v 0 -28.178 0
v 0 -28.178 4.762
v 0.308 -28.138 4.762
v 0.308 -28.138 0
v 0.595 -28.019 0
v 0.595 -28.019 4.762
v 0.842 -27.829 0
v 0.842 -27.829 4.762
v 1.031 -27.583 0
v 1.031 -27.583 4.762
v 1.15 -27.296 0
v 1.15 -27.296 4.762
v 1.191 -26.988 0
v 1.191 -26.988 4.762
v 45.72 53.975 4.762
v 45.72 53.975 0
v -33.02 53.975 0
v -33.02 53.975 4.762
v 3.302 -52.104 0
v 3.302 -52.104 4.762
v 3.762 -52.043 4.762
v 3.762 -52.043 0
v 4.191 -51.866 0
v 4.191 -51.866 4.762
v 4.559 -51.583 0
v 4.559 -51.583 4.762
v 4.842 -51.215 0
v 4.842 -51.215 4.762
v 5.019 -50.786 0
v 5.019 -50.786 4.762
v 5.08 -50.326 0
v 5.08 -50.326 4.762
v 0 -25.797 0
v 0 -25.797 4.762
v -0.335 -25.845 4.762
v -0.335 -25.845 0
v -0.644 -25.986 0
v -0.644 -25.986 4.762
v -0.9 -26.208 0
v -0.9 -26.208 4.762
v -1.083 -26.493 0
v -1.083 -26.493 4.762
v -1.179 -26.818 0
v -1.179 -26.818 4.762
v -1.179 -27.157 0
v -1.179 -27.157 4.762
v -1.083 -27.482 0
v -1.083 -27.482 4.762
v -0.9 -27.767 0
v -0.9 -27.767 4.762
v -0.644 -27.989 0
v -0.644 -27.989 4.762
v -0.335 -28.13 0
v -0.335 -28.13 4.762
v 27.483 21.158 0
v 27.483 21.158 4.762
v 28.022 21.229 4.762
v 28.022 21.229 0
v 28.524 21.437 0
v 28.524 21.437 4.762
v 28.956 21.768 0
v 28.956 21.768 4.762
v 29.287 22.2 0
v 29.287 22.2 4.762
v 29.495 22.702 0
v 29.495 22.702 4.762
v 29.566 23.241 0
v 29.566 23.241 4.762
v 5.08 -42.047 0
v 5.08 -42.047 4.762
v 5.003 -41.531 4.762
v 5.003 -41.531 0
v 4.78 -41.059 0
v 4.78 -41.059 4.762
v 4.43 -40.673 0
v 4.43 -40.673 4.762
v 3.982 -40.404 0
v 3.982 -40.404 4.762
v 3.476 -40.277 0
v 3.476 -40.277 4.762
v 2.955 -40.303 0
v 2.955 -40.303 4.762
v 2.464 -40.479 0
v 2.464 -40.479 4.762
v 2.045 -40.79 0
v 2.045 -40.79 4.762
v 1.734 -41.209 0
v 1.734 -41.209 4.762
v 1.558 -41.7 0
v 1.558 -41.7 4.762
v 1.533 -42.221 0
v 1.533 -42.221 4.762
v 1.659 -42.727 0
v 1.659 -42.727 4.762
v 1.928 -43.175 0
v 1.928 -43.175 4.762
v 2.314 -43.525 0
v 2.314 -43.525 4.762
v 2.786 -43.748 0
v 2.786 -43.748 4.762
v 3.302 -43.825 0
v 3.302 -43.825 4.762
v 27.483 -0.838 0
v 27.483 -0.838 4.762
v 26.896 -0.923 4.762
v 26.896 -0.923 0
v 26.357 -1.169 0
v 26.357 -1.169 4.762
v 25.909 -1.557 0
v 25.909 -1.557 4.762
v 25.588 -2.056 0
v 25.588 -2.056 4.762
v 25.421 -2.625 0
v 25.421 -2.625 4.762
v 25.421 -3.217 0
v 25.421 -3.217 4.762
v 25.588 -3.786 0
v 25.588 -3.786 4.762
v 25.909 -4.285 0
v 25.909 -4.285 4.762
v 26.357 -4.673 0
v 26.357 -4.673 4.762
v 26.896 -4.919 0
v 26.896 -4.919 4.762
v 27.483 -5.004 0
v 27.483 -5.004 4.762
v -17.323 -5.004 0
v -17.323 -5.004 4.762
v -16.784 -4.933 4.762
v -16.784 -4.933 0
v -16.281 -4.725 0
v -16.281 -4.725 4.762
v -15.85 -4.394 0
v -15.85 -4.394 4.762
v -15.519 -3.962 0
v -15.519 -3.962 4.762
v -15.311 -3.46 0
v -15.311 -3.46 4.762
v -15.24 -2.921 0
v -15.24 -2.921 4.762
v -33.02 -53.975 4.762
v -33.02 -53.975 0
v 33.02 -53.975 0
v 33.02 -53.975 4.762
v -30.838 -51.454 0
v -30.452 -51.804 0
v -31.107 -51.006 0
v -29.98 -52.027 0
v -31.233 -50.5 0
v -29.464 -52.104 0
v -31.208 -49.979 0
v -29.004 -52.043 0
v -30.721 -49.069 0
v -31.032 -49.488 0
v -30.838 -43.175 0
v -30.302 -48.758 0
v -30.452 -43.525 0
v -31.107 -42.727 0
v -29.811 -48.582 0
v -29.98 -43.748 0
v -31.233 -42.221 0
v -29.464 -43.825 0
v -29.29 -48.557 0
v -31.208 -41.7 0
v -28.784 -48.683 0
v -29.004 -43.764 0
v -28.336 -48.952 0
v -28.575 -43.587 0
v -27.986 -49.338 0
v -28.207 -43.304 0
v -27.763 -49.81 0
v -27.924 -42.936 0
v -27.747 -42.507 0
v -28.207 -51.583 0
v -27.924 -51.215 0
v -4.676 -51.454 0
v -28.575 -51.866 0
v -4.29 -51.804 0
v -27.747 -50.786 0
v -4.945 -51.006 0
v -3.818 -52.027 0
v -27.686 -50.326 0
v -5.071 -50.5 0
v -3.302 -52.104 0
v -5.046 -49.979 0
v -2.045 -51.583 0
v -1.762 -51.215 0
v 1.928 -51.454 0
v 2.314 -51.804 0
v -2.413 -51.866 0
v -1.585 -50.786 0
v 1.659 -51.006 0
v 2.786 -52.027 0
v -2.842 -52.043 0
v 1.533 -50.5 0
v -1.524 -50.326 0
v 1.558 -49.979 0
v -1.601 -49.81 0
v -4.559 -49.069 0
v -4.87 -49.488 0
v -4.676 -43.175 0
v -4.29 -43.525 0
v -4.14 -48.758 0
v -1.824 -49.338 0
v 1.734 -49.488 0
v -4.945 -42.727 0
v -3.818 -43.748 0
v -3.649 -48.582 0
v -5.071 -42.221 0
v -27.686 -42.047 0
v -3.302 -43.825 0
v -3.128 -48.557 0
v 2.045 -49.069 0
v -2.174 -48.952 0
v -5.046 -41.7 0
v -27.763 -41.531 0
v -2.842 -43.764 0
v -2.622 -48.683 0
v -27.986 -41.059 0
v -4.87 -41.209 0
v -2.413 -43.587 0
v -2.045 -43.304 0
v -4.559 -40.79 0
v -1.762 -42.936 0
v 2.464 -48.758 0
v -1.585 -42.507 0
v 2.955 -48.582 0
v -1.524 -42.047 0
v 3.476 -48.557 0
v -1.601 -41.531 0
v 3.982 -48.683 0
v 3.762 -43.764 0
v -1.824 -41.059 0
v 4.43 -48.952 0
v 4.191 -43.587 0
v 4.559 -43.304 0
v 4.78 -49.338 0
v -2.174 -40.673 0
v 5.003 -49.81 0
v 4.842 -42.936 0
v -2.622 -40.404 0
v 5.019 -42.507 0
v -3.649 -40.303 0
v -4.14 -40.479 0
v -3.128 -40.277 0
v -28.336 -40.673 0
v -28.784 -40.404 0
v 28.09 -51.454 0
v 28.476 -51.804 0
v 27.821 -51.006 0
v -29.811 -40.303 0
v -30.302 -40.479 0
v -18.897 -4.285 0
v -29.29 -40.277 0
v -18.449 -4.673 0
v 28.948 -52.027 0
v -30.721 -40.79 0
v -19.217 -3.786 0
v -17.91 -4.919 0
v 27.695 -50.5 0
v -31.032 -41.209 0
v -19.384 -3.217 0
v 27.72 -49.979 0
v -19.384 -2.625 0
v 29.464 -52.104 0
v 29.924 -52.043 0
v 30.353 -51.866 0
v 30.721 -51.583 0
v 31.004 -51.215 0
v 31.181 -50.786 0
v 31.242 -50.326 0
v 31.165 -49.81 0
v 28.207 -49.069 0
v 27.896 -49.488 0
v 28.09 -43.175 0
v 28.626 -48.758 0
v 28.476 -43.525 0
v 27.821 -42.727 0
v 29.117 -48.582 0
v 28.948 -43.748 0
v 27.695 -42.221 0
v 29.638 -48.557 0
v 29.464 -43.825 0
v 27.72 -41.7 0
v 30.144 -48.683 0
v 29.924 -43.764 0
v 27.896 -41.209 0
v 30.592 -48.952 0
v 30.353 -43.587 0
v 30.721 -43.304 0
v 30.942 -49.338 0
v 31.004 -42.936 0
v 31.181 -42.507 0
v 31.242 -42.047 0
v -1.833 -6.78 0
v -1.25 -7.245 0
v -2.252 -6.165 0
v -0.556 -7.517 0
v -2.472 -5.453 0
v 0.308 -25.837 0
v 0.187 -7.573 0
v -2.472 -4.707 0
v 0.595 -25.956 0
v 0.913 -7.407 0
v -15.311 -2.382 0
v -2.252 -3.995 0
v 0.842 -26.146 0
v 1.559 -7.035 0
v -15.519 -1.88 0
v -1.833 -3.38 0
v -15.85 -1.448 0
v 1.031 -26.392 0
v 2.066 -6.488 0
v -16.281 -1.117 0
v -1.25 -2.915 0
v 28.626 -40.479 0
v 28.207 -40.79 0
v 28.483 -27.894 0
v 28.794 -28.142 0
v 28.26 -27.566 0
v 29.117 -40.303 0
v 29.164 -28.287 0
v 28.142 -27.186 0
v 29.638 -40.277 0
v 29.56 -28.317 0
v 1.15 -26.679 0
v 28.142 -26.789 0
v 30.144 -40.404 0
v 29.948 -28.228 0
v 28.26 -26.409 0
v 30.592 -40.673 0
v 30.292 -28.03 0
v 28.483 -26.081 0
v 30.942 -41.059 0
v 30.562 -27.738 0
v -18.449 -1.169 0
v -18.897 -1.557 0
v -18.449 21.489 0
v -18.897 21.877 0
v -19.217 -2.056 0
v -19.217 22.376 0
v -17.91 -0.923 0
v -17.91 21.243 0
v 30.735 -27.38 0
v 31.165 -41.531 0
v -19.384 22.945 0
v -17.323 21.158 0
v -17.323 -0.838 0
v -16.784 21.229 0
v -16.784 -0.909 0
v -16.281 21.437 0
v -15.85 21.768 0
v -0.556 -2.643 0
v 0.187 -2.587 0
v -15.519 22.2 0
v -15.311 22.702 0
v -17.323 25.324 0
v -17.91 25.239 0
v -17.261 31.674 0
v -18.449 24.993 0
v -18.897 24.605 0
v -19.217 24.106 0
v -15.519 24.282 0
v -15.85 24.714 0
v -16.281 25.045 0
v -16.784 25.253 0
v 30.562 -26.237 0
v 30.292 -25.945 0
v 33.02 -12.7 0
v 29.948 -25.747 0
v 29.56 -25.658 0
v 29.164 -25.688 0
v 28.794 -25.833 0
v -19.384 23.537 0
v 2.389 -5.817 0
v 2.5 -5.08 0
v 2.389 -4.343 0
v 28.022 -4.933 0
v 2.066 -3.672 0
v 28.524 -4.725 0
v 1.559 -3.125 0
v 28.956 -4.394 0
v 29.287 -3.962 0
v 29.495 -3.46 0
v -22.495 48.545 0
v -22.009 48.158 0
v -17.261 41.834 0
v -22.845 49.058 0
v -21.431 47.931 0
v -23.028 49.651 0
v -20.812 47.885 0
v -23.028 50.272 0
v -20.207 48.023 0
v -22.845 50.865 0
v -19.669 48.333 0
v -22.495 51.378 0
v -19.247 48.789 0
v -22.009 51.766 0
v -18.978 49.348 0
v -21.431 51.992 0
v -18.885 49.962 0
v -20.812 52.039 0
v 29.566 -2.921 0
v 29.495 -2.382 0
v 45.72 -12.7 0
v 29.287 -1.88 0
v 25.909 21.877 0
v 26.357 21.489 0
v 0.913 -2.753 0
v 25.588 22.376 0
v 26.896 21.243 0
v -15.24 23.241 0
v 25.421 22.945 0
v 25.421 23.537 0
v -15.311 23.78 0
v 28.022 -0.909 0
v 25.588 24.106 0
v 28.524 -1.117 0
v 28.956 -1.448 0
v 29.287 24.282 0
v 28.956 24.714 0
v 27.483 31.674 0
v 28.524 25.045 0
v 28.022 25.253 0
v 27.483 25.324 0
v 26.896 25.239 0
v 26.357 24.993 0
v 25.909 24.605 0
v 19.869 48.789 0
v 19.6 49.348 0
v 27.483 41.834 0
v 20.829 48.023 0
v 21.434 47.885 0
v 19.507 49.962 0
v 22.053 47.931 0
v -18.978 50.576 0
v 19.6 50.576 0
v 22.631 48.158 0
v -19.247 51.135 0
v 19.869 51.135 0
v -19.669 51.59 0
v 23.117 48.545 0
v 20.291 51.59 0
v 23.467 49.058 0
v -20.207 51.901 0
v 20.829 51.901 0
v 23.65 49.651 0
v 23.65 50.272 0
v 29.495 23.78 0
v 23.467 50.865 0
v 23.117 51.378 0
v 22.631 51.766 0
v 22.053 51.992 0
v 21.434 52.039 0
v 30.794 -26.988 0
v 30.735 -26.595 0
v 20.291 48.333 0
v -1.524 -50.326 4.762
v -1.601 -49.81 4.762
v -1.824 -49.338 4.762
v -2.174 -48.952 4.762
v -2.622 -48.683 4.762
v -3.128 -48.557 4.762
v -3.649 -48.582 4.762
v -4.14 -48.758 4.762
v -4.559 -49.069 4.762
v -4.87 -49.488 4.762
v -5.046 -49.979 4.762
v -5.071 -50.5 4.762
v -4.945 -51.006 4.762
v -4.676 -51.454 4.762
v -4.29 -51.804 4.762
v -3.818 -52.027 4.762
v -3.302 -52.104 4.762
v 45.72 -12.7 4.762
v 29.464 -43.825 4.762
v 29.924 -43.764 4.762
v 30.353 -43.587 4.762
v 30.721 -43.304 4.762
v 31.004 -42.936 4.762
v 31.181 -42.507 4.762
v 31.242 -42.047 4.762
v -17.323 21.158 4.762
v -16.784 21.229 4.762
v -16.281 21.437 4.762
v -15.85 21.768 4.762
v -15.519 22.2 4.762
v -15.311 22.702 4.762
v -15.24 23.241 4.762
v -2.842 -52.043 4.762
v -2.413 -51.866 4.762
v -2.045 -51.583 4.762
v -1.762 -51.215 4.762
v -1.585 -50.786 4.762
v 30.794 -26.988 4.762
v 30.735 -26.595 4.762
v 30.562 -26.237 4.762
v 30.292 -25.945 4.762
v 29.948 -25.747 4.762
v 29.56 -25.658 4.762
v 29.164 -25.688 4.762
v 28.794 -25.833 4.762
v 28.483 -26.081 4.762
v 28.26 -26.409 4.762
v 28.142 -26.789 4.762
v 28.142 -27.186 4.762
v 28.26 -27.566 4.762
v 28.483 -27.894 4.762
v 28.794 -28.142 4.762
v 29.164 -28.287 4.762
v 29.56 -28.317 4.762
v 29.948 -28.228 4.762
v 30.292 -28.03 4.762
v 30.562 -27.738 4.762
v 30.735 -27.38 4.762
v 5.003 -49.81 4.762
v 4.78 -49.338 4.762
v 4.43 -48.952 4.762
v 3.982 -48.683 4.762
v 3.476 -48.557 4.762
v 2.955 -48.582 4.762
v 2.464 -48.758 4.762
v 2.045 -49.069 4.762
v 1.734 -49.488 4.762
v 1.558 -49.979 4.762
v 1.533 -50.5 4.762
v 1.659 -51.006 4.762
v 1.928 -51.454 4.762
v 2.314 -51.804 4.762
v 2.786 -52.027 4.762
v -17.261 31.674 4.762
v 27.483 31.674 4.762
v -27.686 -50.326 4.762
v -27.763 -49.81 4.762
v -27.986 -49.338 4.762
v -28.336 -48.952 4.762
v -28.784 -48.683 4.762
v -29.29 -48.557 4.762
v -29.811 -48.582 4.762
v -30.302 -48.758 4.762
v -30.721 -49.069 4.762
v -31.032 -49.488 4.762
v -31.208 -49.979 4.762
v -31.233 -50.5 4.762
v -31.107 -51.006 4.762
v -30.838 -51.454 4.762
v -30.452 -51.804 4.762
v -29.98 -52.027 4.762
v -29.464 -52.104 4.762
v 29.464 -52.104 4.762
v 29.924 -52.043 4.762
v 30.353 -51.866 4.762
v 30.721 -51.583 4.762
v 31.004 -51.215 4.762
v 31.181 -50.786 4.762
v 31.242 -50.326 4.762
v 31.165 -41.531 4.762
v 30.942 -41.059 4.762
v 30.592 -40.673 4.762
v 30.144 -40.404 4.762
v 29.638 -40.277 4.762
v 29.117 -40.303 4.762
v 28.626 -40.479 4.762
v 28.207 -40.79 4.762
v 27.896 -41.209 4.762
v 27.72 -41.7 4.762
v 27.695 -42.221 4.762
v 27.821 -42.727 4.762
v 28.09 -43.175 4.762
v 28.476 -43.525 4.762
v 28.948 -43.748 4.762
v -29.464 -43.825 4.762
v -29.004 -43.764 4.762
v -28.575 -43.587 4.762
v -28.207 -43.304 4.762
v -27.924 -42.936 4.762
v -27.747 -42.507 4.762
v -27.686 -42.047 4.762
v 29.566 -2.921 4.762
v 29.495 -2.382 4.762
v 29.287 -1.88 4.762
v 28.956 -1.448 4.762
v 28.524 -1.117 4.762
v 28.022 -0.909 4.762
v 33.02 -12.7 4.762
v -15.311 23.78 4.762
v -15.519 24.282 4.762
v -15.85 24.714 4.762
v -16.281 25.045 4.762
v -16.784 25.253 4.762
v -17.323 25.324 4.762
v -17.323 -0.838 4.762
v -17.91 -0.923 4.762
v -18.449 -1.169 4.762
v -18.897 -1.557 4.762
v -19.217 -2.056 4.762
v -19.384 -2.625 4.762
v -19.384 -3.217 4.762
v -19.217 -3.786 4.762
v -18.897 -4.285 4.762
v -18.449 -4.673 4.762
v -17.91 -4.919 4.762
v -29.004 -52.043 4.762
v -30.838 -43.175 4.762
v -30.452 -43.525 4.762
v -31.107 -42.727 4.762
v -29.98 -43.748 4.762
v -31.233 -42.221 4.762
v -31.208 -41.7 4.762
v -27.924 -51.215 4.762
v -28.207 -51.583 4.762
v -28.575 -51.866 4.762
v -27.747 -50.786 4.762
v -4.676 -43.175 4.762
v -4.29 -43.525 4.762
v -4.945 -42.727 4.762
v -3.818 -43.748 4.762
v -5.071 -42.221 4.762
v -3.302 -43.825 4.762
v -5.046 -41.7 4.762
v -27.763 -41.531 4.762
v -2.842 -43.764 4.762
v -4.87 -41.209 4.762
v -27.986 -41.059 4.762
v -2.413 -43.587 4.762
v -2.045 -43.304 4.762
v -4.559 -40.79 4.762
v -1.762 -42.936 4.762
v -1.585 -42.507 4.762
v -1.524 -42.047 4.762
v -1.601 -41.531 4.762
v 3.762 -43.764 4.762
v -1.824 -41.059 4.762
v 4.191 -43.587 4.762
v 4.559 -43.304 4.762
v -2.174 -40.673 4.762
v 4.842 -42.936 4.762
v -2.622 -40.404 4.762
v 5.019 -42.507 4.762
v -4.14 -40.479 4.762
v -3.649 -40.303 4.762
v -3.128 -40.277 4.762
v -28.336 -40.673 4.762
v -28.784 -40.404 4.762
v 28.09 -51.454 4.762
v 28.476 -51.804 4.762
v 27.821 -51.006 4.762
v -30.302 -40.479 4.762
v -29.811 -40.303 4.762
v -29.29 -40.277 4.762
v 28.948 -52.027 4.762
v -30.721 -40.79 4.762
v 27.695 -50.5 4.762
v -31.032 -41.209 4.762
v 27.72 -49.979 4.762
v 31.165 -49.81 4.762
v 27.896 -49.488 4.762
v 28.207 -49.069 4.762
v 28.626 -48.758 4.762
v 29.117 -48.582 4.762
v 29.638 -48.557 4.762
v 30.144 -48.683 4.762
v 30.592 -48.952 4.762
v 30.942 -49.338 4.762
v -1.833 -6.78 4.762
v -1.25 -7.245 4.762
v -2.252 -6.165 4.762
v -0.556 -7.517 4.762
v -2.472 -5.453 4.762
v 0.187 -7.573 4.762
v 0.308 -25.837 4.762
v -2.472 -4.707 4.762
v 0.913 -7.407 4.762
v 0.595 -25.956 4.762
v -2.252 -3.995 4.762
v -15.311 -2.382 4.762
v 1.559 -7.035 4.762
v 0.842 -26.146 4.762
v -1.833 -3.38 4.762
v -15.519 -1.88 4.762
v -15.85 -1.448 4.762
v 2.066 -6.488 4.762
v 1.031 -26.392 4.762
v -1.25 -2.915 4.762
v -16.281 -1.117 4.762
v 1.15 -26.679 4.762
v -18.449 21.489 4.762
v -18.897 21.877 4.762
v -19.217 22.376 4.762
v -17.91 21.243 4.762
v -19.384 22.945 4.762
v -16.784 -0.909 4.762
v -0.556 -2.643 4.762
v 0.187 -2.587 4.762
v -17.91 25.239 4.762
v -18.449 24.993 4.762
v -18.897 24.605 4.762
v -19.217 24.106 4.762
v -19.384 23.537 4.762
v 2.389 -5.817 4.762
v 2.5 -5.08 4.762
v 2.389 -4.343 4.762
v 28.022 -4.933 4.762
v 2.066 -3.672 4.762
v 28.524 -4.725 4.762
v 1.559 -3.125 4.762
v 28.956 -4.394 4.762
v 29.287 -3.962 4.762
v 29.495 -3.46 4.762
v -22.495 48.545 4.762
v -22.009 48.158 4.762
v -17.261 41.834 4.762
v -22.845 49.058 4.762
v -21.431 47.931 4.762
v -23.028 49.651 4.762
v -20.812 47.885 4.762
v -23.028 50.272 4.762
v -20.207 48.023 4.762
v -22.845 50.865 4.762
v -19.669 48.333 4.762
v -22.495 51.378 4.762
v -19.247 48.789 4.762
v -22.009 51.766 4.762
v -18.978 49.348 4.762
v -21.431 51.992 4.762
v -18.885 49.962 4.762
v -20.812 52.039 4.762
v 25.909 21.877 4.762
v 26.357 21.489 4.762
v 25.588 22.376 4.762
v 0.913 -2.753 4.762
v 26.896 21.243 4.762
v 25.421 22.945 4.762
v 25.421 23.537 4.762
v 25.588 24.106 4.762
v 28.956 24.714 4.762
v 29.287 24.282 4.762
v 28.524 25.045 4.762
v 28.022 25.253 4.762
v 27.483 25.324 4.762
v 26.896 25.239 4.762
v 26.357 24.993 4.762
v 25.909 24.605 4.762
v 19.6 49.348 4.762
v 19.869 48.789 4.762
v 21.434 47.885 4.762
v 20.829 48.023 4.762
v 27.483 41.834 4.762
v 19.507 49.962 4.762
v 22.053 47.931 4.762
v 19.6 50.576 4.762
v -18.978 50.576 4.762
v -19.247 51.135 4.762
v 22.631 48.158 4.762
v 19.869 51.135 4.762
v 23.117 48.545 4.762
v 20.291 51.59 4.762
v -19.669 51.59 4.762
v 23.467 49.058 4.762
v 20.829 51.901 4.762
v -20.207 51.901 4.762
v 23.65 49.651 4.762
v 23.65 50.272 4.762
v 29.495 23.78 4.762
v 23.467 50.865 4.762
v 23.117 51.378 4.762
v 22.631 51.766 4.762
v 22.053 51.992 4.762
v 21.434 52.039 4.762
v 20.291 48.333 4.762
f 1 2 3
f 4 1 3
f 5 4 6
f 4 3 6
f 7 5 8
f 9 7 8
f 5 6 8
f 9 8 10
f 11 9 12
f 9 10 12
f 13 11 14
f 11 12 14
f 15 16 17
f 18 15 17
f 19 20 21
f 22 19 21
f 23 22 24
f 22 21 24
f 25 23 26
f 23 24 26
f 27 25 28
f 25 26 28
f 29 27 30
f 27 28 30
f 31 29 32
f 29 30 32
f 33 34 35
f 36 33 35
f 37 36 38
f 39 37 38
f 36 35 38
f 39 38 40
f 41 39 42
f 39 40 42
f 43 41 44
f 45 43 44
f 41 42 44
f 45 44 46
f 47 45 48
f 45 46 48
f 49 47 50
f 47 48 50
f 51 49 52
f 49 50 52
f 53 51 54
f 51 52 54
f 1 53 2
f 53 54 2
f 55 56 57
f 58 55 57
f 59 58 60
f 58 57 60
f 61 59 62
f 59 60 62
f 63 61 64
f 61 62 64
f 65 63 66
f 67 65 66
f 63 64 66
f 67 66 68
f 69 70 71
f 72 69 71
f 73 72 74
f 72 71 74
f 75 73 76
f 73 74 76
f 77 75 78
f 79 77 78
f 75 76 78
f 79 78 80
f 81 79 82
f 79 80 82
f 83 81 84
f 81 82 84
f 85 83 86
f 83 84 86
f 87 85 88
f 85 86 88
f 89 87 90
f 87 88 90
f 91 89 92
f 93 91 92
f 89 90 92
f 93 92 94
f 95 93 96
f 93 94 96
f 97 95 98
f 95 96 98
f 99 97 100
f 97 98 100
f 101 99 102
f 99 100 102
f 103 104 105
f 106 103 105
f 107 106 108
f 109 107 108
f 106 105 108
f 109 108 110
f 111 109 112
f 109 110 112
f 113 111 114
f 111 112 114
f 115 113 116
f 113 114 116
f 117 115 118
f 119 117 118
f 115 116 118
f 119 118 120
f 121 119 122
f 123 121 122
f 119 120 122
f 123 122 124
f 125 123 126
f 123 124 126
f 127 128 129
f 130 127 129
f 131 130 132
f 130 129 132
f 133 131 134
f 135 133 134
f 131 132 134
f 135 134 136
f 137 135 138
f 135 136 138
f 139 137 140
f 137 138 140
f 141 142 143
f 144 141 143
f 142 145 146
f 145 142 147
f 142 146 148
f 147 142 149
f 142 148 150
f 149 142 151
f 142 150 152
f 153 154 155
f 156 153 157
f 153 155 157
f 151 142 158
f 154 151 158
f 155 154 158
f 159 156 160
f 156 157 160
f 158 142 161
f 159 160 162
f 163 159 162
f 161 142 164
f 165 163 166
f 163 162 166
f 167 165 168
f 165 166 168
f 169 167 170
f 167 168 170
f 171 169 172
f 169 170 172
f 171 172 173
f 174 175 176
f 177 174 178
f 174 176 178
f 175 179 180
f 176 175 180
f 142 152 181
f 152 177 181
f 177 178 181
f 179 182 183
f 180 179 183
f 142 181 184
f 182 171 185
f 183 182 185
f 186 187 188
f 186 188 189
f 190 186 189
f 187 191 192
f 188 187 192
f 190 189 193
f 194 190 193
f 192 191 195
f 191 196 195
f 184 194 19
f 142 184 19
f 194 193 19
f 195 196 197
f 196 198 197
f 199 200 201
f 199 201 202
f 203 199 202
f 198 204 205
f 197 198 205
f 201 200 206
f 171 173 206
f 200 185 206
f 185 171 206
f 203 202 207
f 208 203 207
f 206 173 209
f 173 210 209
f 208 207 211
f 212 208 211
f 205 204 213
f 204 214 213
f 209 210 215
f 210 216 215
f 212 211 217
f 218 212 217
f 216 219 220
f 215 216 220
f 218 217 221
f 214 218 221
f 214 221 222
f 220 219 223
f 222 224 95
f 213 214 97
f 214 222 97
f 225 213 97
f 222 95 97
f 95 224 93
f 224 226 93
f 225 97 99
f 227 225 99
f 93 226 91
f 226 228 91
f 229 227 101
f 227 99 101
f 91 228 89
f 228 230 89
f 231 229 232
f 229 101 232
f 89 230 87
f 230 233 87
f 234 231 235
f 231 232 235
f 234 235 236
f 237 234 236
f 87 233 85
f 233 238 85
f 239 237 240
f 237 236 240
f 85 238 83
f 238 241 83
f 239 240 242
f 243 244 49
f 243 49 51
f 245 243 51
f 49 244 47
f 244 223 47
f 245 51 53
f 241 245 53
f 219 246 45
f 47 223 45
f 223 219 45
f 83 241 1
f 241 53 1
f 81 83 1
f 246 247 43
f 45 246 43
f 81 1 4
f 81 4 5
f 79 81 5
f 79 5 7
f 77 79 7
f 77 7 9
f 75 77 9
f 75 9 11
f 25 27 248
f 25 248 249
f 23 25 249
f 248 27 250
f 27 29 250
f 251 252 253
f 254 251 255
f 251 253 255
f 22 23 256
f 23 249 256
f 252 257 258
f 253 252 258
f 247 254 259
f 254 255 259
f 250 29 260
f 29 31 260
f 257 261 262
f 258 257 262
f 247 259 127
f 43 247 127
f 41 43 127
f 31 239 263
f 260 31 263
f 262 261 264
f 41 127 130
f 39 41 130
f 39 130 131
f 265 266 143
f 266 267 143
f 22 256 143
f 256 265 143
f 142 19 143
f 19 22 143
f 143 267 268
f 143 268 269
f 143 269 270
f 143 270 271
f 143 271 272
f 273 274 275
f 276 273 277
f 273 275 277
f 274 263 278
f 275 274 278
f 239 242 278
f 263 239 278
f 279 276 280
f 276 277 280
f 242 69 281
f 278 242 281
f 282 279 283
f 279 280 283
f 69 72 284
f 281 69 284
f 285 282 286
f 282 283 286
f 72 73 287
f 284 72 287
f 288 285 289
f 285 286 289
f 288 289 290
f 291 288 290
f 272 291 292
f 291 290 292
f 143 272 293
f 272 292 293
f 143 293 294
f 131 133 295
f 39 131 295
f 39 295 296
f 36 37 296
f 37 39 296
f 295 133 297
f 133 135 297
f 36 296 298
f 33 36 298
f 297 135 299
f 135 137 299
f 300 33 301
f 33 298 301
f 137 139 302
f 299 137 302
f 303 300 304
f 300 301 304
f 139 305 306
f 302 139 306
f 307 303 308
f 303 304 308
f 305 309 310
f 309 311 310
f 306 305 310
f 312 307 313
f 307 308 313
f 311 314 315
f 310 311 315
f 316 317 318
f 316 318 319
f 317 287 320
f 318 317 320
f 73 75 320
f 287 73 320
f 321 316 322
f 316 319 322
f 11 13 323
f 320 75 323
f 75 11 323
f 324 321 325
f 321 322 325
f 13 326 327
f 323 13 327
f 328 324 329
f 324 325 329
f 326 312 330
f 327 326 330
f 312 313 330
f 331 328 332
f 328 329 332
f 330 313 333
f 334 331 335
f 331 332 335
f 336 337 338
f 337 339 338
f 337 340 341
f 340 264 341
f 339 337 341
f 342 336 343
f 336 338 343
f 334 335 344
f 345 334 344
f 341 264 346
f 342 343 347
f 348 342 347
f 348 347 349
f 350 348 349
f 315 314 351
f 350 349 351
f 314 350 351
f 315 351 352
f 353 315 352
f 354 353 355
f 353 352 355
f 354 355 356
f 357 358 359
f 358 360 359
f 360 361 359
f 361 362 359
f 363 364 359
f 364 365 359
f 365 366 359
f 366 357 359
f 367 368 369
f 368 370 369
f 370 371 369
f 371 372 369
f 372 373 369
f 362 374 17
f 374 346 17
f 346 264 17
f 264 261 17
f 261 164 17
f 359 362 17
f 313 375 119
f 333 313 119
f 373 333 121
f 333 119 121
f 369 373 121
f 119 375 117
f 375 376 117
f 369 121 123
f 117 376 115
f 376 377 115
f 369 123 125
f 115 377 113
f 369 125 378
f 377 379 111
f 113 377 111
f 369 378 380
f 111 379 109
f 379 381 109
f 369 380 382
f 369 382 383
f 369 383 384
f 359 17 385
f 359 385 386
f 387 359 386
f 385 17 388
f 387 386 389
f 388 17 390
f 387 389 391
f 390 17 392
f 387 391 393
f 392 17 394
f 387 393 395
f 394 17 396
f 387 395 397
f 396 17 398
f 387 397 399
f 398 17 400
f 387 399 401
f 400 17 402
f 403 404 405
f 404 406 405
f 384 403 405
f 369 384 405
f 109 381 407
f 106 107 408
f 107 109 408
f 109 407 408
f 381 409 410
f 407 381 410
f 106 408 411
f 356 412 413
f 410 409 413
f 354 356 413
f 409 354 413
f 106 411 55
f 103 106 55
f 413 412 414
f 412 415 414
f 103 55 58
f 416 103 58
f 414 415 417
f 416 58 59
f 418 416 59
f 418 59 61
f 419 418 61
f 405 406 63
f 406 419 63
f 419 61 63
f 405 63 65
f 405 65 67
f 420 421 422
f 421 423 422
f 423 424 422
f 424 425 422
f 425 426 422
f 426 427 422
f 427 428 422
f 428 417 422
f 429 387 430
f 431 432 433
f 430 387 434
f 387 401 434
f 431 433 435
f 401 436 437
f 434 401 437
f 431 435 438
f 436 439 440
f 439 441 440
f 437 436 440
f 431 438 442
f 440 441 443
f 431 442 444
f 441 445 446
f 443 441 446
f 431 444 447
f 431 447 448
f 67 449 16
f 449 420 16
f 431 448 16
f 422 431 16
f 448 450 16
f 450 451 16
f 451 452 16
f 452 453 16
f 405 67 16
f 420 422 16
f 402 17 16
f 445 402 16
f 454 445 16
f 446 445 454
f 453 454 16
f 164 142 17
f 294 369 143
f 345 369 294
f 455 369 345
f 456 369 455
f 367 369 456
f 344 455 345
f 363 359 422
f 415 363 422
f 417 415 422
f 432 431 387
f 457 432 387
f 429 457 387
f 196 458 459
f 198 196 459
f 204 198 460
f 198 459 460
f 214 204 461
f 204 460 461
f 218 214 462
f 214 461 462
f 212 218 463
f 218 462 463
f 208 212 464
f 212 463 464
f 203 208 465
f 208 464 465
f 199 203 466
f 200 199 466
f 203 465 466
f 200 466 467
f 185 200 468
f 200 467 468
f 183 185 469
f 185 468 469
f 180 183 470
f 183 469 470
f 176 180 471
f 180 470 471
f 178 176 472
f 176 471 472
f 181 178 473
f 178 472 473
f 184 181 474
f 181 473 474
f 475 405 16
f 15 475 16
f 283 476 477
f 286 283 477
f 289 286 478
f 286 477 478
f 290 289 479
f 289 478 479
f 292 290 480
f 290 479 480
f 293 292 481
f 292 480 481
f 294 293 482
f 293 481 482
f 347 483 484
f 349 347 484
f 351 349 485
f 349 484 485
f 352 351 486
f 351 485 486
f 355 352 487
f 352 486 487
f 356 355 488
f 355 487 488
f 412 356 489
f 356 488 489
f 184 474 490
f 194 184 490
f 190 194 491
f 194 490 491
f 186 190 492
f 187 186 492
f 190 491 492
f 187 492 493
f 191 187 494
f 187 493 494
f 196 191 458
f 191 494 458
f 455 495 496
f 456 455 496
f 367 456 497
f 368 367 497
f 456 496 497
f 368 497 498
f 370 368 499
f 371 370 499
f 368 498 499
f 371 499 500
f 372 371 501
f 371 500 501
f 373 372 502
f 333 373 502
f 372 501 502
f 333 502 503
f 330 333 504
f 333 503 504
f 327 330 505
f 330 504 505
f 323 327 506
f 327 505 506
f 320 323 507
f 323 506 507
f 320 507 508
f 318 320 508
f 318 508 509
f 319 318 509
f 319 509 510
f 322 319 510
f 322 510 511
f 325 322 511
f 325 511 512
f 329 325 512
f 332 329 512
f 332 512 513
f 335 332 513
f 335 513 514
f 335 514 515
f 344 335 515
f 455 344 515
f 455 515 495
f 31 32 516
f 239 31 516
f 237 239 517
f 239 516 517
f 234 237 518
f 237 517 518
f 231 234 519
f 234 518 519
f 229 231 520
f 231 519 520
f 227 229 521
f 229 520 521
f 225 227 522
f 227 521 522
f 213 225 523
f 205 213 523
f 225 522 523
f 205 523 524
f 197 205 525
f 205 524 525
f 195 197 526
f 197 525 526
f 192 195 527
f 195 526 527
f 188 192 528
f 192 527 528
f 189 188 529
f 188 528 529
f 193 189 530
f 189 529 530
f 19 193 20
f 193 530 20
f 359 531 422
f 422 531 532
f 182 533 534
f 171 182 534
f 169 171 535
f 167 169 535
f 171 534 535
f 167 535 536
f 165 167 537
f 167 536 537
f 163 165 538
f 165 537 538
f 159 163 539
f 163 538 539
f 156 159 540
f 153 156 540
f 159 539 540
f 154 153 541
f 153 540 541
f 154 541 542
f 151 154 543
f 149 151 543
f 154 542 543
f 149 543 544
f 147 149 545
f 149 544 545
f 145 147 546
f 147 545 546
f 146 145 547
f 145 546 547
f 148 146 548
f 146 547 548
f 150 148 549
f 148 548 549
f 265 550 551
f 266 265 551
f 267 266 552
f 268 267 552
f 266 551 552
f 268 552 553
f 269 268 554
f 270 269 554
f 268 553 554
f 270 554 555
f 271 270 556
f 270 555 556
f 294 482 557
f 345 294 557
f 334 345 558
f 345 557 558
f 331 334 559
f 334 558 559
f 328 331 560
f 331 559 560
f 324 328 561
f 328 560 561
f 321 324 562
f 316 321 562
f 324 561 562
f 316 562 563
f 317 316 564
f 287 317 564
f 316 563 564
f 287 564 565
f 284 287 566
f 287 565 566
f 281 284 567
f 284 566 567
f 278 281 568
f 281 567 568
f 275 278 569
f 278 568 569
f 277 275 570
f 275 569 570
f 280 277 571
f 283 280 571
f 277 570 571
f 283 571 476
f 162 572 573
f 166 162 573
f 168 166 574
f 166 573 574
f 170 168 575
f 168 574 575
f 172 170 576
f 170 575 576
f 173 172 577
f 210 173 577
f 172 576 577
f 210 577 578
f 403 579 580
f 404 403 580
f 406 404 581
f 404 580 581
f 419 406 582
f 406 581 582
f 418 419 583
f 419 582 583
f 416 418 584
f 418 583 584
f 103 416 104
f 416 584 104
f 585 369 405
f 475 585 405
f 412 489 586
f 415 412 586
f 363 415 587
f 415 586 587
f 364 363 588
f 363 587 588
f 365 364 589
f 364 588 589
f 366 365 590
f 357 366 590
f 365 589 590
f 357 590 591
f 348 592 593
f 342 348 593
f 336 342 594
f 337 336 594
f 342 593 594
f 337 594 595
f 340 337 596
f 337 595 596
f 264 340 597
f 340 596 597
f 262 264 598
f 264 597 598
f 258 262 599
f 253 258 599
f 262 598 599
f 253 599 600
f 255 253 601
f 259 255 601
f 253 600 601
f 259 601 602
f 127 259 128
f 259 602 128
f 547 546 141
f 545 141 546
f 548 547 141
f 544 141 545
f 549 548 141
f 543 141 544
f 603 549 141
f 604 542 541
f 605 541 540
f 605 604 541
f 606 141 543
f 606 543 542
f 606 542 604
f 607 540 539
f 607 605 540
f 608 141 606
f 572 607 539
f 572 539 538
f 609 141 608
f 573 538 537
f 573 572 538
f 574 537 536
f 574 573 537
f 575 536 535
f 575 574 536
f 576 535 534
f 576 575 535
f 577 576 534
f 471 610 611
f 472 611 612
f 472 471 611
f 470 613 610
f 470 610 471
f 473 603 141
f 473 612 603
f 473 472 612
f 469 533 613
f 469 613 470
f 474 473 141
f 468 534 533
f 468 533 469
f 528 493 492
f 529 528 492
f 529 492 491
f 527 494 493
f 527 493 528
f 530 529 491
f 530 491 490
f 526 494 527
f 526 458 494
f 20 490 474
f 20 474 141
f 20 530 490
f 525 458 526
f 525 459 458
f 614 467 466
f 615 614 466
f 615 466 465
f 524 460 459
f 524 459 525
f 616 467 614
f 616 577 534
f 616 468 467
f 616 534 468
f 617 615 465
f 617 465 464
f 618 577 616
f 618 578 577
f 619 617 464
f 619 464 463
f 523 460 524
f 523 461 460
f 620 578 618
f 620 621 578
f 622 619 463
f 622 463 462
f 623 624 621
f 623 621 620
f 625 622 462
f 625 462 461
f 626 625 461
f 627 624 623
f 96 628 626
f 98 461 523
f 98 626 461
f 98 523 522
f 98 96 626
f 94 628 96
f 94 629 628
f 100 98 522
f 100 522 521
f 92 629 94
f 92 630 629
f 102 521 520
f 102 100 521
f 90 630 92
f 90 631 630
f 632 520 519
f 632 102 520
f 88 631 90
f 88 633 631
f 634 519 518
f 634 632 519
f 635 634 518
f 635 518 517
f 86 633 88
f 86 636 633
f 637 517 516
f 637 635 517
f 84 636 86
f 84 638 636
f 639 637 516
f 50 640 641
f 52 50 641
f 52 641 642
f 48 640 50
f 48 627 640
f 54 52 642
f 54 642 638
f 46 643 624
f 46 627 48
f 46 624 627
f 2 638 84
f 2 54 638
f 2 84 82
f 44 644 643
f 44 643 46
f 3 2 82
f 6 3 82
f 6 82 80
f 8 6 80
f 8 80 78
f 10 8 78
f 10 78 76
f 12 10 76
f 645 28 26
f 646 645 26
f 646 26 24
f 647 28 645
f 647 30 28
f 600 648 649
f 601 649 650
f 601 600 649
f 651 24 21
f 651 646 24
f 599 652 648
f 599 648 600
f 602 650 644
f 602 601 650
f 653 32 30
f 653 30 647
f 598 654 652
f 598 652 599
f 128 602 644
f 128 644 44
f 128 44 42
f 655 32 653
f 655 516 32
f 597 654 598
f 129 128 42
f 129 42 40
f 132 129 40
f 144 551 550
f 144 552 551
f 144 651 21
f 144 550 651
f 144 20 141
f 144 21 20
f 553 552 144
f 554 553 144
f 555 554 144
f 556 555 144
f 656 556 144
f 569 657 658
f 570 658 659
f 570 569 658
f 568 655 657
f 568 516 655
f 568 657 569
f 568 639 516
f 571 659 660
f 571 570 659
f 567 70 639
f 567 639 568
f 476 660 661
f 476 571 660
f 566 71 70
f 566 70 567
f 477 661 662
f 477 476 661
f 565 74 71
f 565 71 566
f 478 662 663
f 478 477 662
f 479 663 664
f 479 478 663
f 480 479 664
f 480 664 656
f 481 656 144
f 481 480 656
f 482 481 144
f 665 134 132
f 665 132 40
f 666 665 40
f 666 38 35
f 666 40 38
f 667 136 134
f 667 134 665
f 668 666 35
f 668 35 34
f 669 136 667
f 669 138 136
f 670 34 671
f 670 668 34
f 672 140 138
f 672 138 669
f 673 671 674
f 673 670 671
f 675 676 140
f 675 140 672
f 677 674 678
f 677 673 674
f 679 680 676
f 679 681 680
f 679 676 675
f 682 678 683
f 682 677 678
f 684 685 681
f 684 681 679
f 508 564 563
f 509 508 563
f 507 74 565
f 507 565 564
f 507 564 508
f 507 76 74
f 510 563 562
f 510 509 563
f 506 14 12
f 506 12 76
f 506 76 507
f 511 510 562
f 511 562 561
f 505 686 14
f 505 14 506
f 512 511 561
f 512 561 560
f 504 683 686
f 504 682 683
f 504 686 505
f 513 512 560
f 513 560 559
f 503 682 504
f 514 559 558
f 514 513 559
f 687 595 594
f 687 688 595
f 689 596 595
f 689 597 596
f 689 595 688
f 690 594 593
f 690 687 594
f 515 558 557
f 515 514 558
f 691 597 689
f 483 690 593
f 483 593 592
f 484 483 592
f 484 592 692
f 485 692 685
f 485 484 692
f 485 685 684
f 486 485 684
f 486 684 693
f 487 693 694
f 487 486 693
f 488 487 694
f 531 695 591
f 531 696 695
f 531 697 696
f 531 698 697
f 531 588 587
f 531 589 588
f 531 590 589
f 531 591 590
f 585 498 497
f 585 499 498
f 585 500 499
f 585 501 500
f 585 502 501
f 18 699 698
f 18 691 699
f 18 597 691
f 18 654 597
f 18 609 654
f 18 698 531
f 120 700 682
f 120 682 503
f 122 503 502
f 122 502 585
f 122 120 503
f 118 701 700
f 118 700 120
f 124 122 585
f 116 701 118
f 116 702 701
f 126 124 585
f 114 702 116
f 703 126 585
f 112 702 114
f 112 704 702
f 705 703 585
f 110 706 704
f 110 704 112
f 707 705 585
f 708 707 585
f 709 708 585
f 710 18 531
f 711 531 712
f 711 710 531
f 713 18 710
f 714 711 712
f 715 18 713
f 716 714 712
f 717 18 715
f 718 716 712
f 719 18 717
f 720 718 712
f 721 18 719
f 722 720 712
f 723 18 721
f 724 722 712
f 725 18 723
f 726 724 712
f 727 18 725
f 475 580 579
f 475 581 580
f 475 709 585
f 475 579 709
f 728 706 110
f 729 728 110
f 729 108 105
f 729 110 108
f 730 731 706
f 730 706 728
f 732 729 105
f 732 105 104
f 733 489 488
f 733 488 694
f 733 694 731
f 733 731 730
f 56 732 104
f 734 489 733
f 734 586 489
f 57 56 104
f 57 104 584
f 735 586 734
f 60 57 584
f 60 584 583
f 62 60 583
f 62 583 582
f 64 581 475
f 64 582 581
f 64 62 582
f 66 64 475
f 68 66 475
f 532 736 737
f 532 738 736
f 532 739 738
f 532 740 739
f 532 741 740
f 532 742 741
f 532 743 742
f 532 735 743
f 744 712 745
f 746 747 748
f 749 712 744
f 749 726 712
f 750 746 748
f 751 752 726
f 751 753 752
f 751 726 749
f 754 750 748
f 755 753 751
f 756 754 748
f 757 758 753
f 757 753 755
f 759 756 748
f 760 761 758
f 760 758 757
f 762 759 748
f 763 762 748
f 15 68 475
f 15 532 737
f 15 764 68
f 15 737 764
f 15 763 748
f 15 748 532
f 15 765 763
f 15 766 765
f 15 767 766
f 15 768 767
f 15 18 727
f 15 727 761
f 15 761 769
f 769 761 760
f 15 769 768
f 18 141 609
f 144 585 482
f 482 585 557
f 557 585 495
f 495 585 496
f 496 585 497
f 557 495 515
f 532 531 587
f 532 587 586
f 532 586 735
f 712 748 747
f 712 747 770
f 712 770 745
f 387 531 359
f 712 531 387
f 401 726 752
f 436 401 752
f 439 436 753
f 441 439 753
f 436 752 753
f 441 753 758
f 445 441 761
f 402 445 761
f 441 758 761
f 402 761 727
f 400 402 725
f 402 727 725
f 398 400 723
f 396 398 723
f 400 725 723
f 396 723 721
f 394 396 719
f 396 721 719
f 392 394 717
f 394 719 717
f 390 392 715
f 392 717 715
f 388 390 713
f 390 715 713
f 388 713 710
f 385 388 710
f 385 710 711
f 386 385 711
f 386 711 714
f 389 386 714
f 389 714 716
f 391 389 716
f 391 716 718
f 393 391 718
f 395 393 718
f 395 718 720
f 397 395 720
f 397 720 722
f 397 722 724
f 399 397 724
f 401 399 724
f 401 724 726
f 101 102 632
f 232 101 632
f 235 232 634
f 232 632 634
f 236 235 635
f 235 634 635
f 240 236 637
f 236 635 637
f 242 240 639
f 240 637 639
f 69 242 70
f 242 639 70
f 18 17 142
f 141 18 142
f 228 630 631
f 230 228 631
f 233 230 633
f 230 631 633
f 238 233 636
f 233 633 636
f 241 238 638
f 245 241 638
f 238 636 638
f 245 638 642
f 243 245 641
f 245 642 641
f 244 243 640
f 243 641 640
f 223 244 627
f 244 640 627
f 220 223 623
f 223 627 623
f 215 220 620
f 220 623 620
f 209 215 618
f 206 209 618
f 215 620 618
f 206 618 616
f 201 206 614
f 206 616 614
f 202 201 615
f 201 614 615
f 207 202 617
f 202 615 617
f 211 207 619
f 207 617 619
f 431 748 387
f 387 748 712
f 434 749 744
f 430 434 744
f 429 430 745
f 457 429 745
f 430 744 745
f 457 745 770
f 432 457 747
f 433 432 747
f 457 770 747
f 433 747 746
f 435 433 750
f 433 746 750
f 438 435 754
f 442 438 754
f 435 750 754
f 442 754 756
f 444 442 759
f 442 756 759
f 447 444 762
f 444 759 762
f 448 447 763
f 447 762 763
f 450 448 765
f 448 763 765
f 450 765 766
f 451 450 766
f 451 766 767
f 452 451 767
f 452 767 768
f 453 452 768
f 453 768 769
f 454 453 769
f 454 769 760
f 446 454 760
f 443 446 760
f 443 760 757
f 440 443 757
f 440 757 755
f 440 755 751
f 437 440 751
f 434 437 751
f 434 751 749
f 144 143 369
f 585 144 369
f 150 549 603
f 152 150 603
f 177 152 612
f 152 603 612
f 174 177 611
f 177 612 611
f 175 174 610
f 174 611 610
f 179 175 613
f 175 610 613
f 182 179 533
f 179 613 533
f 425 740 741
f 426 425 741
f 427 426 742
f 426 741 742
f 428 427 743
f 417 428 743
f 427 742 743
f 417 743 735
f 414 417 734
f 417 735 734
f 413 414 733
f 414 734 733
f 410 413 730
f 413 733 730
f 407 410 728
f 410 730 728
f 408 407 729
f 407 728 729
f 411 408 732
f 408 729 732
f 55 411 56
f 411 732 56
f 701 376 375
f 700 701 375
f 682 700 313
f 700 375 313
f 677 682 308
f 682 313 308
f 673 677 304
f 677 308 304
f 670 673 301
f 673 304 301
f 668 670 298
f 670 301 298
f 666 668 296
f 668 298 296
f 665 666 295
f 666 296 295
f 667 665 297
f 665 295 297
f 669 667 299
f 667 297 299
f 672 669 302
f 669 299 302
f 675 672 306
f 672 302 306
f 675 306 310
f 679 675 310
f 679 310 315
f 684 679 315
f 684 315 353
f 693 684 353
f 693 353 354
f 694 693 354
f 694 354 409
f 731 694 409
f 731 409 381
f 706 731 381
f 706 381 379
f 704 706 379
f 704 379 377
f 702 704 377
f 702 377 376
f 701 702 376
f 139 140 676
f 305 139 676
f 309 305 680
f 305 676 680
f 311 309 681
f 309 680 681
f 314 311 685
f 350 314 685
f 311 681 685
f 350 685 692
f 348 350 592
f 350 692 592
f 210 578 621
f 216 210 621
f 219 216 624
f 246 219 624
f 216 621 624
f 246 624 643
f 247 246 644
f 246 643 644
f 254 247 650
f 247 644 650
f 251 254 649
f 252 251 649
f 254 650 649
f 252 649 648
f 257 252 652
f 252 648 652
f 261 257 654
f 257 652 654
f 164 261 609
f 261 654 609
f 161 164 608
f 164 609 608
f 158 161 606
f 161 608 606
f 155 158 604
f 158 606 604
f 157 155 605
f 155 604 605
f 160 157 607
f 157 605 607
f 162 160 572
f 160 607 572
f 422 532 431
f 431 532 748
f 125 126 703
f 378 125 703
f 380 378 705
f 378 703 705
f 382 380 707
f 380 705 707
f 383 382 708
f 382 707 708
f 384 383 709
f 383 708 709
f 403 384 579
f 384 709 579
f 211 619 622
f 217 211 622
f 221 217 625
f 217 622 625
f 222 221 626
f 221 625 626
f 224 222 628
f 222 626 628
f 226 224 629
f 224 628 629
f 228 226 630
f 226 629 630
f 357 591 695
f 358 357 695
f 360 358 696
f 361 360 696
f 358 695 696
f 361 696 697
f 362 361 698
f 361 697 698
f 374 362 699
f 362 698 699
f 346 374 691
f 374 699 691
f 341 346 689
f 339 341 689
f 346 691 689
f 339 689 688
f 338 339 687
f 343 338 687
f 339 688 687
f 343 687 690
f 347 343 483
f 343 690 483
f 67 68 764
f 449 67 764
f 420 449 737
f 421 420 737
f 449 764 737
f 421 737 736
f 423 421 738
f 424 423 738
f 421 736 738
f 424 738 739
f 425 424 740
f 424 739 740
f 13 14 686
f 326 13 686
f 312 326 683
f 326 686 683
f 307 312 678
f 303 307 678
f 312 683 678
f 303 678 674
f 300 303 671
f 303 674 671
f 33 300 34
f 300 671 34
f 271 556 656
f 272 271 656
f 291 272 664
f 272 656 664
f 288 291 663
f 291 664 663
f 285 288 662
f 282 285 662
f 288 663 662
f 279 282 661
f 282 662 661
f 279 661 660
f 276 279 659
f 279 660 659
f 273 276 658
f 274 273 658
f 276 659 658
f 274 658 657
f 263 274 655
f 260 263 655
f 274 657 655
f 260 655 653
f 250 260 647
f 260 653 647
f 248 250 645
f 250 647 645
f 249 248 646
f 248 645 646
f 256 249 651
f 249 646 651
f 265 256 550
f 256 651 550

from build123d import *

# Parameters (mm, degrees)
F1_DEPTH  = 4.7625
F2_W      = 23.6109700747
F2_H      = 10.16
F2_W_2    = 21.1328
F3_DEPTH  = 25.4
F4_R      = 2.5
F5_DEPTH  = 25.4
F6_R      = 1.3330740387
F7_DEPTH  = 25.4
F2_R      = 2.0828
F8_DEPTH  = 25.4
F10_DEPTH = 25.4


# Not quite as in the source:
# - a feature names something its author has since deleted; it is built from what else it names


with BuildPart() as f1:
    # F0 (on Top) → F1 (new body)
    with BuildSketch(Plane.XY):
        Polygon((45.72, 53.975), (33.02, 53.975), (-33.02, 53.975), (-33.02, -53.975), (33.02, -53.975), (33.02, -12.7), (45.72, -12.7), align=None)
    extrude(amount=F1_DEPTH)

    # F2 (on face) → F3 (cut)
    with BuildSketch(Plane.XY.offset(4.7625)):
        with Locations((-5.4554850374, 36.7538)):
            Rectangle(F2_W, F2_H)
        with Locations((16.9164, 36.7538)):
            Rectangle(F2_W_2, F2_H)
        with BuildLine():
            ThreePointArc((29.5656, 23.241), (28.9555620039, 24.7137620039), (27.4828, 25.3238))
            Line((27.4828, 25.3238), (27.4828, 21.1582))
            ThreePointArc((27.4828, 21.1582), (28.9555620039, 21.7682379961), (29.5656, 23.241))
        make_face()
        with BuildLine():
            Line((27.4828, 21.1582), (27.4828, 25.3238))
            ThreePointArc((27.4828, 25.3238), (25.4, 23.241), (27.4828, 21.1582))
        make_face()
        with BuildLine():
            ThreePointArc((27.4828, -0.8382), (25.4, -2.921), (27.4828, -5.0038))
            Line((27.4828, -5.0038), (27.4828, -0.8382))
        make_face()
        with BuildLine():
            Line((27.4828, -0.8382), (27.4828, -5.0038))
            ThreePointArc((27.4828, -5.0038), (28.9555620039, -4.3937620039), (29.5656, -2.921))
            ThreePointArc((29.5656, -2.921), (28.9555620039, -1.4482379961), (27.4828, -0.8382))
        make_face()
        with BuildLine():
            ThreePointArc((-15.24, 23.241), (-15.8500379961, 24.7137620039), (-17.3228, 25.3238))
            Line((-17.3228, 25.3238), (-17.3228, 21.1582))
            ThreePointArc((-17.3228, 21.1582), (-15.8500379961, 21.7682379961), (-15.24, 23.241))
        make_face()
        with BuildLine():
            Line((-17.3228, 21.1582), (-17.3228, 25.3238))
            ThreePointArc((-17.3228, 25.3238), (-19.4056, 23.241), (-17.3228, 21.1582))
        make_face()
        with BuildLine():
            ThreePointArc((-17.3228, -0.8382), (-19.4056, -2.921), (-17.3228, -5.0038))
            Line((-17.3228, -5.0038), (-17.3228, -0.8382))
        make_face()
        with BuildLine():
            Line((-17.3228, -0.8382), (-17.3228, -5.0038))
            ThreePointArc((-17.3228, -5.0038), (-15.8500379961, -4.3937620039), (-15.24, -2.921))
            ThreePointArc((-15.24, -2.921), (-15.8500379961, -1.4482379961), (-17.3228, -0.8382))
        make_face()
    extrude(amount=-F3_DEPTH, mode=Mode.SUBTRACT)

    # F4 (on face) → F5 (cut)
    with BuildSketch(Plane(origin=(0, 0, 0), x_dir=(1, 0, 0), z_dir=(0, 0, -1))):
        with Locations((0, 5.08)):
            Circle(F4_R)
    extrude(amount=-F5_DEPTH, mode=Mode.SUBTRACT)

    # F6 (on face) → F7 (cut)
    with BuildSketch(Plane.XY.offset(4.7625)):
        with BuildLine():
            Line((0, -28.178125), (0, -25.796875))
            ThreePointArc((0, -25.796875), (-1.190625, -26.9875), (0, -28.178125))
        make_face()
        with BuildLine():
            ThreePointArc((0, -28.178125), (0.8418990114, -27.8293990114), (1.190625, -26.9875))
            ThreePointArc((1.190625, -26.9875), (0.8418990114, -26.1456009886), (0, -25.796875))
            Line((0, -25.796875), (0, -28.178125))
        make_face()
        with Locations((29.460657388, -26.9875)):
            Circle(F6_R)
    extrude(amount=-F7_DEPTH, mode=Mode.SUBTRACT)

    # F2 (on face) → F8 (cut)
    with BuildSketch(Plane.XY.offset(4.7625)):
        with Locations((-20.9680330008, 49.9618)):
            Circle(F2_R)
        with BuildLine():
            ThreePointArc((23.6728, 49.9618), (21.59, 52.0446), (19.5072, 49.9618))
            ThreePointArc((19.5072, 49.9618), (21.59, 47.879), (23.6728, 49.9618))
        make_face()
    extrude(amount=-F8_DEPTH, mode=Mode.SUBTRACT)

    # F9 (on face) → F10 (cut)
    with BuildSketch(Plane.XY.offset(4.7625)):
        with BuildLine():
            Line((-29.464, -48.5479413316), (-29.464, -52.1039413316))
            ThreePointArc((-29.464, -52.1039413316), (-28.2067641431, -51.5831771885), (-27.686, -50.3259413316))
            ThreePointArc((-27.686, -50.3259413316), (-28.2067641431, -49.0687054746), (-29.464, -48.5479413316))
        make_face()
        with BuildLine():
            ThreePointArc((-29.464, -48.5479413316), (-31.242, -50.3259413316), (-29.464, -52.1039413316))
            Line((-29.464, -52.1039413316), (-29.464, -48.5479413316))
        make_face()
        with BuildLine():
            ThreePointArc((-27.686, -42.0469199679), (-28.2067641431, -40.7896841109), (-29.464, -40.2689199679))
            Line((-29.464, -40.2689199679), (-29.464, -43.8249199679))
            ThreePointArc((-29.464, -43.8249199679), (-28.2067641431, -43.3041558248), (-27.686, -42.0469199679))
        make_face()
        with BuildLine():
            Line((-29.464, -43.8249199679), (-29.464, -40.2689199679))
            ThreePointArc((-29.464, -40.2689199679), (-31.242, -42.0469199679), (-29.464, -43.8249199679))
        make_face()
        with BuildLine():
            Line((-3.302, -43.8249199679), (-3.302, -40.2689199679))
            ThreePointArc((-3.302, -40.2689199679), (-5.08, -42.0469199679), (-3.302, -43.8249199679))
        make_face()
        with BuildLine():
            ThreePointArc((-1.524, -42.0469199679), (-2.0447641431, -40.7896841109), (-3.302, -40.2689199679))
            Line((-3.302, -40.2689199679), (-3.302, -43.8249199679))
            ThreePointArc((-3.302, -43.8249199679), (-2.0447641431, -43.3041558248), (-1.524, -42.0469199679))
        make_face()
        with BuildLine():
            ThreePointArc((-3.302, -48.5479413316), (-5.08, -50.3259413316), (-3.302, -52.1039413316))
            Line((-3.302, -52.1039413316), (-3.302, -48.5479413316))
        make_face()
        with BuildLine():
            Line((-3.302, -48.5479413316), (-3.302, -52.1039413316))
            ThreePointArc((-3.302, -52.1039413316), (-2.0447641431, -51.5831771885), (-1.524, -50.3259413316))
            ThreePointArc((-1.524, -50.3259413316), (-2.0447641431, -49.0687054746), (-3.302, -48.5479413316))
        make_face()
        with BuildLine():
            ThreePointArc((3.302, -48.5479413316), (1.524, -50.3259413316), (3.302, -52.1039413316))
            Line((3.302, -52.1039413316), (3.302, -48.5479413316))
        make_face()
        with BuildLine():
            Line((3.302, -48.5479413316), (3.302, -52.1039413316))
            ThreePointArc((3.302, -52.1039413316), (4.5592358569, -51.5831771885), (5.08, -50.3259413316))
            ThreePointArc((5.08, -50.3259413316), (4.5592358569, -49.0687054746), (3.302, -48.5479413316))
        make_face()
        with BuildLine():
            ThreePointArc((5.08, -42.0469199679), (4.5592358569, -40.7896841109), (3.302, -40.2689199679))
            Line((3.302, -40.2689199679), (3.302, -43.8249199679))
            ThreePointArc((3.302, -43.8249199679), (4.5592358569, -43.3041558248), (5.08, -42.0469199679))
        make_face()
        with BuildLine():
            Line((3.302, -43.8249199679), (3.302, -40.2689199679))
            ThreePointArc((3.302, -40.2689199679), (1.524, -42.0469199679), (3.302, -43.8249199679))
        make_face()
        with BuildLine():
            Line((29.464, -43.8249199679), (29.464, -40.2689199679))
            ThreePointArc((29.464, -40.2689199679), (27.686, -42.0469199679), (29.464, -43.8249199679))
        make_face()
        with BuildLine():
            ThreePointArc((31.242, -42.0469199679), (30.7212358569, -40.7896841109), (29.464, -40.2689199679))
            Line((29.464, -40.2689199679), (29.464, -43.8249199679))
            ThreePointArc((29.464, -43.8249199679), (30.7212358569, -43.3041558248), (31.242, -42.0469199679))
        make_face()
        with BuildLine():
            Line((29.464, -48.5479413316), (29.464, -52.1039413316))
            ThreePointArc((29.464, -52.1039413316), (30.7212358569, -51.5831771885), (31.242, -50.3259413316))
            ThreePointArc((31.242, -50.3259413316), (30.7212358569, -49.0687054746), (29.464, -48.5479413316))
        make_face()
        with BuildLine():
            ThreePointArc((29.464, -48.5479413316), (27.686, -50.3259413316), (29.464, -52.1039413316))
            Line((29.464, -52.1039413316), (29.464, -48.5479413316))
        make_face()
    extrude(amount=-F10_DEPTH, mode=Mode.SUBTRACT)


solid = f1.part
